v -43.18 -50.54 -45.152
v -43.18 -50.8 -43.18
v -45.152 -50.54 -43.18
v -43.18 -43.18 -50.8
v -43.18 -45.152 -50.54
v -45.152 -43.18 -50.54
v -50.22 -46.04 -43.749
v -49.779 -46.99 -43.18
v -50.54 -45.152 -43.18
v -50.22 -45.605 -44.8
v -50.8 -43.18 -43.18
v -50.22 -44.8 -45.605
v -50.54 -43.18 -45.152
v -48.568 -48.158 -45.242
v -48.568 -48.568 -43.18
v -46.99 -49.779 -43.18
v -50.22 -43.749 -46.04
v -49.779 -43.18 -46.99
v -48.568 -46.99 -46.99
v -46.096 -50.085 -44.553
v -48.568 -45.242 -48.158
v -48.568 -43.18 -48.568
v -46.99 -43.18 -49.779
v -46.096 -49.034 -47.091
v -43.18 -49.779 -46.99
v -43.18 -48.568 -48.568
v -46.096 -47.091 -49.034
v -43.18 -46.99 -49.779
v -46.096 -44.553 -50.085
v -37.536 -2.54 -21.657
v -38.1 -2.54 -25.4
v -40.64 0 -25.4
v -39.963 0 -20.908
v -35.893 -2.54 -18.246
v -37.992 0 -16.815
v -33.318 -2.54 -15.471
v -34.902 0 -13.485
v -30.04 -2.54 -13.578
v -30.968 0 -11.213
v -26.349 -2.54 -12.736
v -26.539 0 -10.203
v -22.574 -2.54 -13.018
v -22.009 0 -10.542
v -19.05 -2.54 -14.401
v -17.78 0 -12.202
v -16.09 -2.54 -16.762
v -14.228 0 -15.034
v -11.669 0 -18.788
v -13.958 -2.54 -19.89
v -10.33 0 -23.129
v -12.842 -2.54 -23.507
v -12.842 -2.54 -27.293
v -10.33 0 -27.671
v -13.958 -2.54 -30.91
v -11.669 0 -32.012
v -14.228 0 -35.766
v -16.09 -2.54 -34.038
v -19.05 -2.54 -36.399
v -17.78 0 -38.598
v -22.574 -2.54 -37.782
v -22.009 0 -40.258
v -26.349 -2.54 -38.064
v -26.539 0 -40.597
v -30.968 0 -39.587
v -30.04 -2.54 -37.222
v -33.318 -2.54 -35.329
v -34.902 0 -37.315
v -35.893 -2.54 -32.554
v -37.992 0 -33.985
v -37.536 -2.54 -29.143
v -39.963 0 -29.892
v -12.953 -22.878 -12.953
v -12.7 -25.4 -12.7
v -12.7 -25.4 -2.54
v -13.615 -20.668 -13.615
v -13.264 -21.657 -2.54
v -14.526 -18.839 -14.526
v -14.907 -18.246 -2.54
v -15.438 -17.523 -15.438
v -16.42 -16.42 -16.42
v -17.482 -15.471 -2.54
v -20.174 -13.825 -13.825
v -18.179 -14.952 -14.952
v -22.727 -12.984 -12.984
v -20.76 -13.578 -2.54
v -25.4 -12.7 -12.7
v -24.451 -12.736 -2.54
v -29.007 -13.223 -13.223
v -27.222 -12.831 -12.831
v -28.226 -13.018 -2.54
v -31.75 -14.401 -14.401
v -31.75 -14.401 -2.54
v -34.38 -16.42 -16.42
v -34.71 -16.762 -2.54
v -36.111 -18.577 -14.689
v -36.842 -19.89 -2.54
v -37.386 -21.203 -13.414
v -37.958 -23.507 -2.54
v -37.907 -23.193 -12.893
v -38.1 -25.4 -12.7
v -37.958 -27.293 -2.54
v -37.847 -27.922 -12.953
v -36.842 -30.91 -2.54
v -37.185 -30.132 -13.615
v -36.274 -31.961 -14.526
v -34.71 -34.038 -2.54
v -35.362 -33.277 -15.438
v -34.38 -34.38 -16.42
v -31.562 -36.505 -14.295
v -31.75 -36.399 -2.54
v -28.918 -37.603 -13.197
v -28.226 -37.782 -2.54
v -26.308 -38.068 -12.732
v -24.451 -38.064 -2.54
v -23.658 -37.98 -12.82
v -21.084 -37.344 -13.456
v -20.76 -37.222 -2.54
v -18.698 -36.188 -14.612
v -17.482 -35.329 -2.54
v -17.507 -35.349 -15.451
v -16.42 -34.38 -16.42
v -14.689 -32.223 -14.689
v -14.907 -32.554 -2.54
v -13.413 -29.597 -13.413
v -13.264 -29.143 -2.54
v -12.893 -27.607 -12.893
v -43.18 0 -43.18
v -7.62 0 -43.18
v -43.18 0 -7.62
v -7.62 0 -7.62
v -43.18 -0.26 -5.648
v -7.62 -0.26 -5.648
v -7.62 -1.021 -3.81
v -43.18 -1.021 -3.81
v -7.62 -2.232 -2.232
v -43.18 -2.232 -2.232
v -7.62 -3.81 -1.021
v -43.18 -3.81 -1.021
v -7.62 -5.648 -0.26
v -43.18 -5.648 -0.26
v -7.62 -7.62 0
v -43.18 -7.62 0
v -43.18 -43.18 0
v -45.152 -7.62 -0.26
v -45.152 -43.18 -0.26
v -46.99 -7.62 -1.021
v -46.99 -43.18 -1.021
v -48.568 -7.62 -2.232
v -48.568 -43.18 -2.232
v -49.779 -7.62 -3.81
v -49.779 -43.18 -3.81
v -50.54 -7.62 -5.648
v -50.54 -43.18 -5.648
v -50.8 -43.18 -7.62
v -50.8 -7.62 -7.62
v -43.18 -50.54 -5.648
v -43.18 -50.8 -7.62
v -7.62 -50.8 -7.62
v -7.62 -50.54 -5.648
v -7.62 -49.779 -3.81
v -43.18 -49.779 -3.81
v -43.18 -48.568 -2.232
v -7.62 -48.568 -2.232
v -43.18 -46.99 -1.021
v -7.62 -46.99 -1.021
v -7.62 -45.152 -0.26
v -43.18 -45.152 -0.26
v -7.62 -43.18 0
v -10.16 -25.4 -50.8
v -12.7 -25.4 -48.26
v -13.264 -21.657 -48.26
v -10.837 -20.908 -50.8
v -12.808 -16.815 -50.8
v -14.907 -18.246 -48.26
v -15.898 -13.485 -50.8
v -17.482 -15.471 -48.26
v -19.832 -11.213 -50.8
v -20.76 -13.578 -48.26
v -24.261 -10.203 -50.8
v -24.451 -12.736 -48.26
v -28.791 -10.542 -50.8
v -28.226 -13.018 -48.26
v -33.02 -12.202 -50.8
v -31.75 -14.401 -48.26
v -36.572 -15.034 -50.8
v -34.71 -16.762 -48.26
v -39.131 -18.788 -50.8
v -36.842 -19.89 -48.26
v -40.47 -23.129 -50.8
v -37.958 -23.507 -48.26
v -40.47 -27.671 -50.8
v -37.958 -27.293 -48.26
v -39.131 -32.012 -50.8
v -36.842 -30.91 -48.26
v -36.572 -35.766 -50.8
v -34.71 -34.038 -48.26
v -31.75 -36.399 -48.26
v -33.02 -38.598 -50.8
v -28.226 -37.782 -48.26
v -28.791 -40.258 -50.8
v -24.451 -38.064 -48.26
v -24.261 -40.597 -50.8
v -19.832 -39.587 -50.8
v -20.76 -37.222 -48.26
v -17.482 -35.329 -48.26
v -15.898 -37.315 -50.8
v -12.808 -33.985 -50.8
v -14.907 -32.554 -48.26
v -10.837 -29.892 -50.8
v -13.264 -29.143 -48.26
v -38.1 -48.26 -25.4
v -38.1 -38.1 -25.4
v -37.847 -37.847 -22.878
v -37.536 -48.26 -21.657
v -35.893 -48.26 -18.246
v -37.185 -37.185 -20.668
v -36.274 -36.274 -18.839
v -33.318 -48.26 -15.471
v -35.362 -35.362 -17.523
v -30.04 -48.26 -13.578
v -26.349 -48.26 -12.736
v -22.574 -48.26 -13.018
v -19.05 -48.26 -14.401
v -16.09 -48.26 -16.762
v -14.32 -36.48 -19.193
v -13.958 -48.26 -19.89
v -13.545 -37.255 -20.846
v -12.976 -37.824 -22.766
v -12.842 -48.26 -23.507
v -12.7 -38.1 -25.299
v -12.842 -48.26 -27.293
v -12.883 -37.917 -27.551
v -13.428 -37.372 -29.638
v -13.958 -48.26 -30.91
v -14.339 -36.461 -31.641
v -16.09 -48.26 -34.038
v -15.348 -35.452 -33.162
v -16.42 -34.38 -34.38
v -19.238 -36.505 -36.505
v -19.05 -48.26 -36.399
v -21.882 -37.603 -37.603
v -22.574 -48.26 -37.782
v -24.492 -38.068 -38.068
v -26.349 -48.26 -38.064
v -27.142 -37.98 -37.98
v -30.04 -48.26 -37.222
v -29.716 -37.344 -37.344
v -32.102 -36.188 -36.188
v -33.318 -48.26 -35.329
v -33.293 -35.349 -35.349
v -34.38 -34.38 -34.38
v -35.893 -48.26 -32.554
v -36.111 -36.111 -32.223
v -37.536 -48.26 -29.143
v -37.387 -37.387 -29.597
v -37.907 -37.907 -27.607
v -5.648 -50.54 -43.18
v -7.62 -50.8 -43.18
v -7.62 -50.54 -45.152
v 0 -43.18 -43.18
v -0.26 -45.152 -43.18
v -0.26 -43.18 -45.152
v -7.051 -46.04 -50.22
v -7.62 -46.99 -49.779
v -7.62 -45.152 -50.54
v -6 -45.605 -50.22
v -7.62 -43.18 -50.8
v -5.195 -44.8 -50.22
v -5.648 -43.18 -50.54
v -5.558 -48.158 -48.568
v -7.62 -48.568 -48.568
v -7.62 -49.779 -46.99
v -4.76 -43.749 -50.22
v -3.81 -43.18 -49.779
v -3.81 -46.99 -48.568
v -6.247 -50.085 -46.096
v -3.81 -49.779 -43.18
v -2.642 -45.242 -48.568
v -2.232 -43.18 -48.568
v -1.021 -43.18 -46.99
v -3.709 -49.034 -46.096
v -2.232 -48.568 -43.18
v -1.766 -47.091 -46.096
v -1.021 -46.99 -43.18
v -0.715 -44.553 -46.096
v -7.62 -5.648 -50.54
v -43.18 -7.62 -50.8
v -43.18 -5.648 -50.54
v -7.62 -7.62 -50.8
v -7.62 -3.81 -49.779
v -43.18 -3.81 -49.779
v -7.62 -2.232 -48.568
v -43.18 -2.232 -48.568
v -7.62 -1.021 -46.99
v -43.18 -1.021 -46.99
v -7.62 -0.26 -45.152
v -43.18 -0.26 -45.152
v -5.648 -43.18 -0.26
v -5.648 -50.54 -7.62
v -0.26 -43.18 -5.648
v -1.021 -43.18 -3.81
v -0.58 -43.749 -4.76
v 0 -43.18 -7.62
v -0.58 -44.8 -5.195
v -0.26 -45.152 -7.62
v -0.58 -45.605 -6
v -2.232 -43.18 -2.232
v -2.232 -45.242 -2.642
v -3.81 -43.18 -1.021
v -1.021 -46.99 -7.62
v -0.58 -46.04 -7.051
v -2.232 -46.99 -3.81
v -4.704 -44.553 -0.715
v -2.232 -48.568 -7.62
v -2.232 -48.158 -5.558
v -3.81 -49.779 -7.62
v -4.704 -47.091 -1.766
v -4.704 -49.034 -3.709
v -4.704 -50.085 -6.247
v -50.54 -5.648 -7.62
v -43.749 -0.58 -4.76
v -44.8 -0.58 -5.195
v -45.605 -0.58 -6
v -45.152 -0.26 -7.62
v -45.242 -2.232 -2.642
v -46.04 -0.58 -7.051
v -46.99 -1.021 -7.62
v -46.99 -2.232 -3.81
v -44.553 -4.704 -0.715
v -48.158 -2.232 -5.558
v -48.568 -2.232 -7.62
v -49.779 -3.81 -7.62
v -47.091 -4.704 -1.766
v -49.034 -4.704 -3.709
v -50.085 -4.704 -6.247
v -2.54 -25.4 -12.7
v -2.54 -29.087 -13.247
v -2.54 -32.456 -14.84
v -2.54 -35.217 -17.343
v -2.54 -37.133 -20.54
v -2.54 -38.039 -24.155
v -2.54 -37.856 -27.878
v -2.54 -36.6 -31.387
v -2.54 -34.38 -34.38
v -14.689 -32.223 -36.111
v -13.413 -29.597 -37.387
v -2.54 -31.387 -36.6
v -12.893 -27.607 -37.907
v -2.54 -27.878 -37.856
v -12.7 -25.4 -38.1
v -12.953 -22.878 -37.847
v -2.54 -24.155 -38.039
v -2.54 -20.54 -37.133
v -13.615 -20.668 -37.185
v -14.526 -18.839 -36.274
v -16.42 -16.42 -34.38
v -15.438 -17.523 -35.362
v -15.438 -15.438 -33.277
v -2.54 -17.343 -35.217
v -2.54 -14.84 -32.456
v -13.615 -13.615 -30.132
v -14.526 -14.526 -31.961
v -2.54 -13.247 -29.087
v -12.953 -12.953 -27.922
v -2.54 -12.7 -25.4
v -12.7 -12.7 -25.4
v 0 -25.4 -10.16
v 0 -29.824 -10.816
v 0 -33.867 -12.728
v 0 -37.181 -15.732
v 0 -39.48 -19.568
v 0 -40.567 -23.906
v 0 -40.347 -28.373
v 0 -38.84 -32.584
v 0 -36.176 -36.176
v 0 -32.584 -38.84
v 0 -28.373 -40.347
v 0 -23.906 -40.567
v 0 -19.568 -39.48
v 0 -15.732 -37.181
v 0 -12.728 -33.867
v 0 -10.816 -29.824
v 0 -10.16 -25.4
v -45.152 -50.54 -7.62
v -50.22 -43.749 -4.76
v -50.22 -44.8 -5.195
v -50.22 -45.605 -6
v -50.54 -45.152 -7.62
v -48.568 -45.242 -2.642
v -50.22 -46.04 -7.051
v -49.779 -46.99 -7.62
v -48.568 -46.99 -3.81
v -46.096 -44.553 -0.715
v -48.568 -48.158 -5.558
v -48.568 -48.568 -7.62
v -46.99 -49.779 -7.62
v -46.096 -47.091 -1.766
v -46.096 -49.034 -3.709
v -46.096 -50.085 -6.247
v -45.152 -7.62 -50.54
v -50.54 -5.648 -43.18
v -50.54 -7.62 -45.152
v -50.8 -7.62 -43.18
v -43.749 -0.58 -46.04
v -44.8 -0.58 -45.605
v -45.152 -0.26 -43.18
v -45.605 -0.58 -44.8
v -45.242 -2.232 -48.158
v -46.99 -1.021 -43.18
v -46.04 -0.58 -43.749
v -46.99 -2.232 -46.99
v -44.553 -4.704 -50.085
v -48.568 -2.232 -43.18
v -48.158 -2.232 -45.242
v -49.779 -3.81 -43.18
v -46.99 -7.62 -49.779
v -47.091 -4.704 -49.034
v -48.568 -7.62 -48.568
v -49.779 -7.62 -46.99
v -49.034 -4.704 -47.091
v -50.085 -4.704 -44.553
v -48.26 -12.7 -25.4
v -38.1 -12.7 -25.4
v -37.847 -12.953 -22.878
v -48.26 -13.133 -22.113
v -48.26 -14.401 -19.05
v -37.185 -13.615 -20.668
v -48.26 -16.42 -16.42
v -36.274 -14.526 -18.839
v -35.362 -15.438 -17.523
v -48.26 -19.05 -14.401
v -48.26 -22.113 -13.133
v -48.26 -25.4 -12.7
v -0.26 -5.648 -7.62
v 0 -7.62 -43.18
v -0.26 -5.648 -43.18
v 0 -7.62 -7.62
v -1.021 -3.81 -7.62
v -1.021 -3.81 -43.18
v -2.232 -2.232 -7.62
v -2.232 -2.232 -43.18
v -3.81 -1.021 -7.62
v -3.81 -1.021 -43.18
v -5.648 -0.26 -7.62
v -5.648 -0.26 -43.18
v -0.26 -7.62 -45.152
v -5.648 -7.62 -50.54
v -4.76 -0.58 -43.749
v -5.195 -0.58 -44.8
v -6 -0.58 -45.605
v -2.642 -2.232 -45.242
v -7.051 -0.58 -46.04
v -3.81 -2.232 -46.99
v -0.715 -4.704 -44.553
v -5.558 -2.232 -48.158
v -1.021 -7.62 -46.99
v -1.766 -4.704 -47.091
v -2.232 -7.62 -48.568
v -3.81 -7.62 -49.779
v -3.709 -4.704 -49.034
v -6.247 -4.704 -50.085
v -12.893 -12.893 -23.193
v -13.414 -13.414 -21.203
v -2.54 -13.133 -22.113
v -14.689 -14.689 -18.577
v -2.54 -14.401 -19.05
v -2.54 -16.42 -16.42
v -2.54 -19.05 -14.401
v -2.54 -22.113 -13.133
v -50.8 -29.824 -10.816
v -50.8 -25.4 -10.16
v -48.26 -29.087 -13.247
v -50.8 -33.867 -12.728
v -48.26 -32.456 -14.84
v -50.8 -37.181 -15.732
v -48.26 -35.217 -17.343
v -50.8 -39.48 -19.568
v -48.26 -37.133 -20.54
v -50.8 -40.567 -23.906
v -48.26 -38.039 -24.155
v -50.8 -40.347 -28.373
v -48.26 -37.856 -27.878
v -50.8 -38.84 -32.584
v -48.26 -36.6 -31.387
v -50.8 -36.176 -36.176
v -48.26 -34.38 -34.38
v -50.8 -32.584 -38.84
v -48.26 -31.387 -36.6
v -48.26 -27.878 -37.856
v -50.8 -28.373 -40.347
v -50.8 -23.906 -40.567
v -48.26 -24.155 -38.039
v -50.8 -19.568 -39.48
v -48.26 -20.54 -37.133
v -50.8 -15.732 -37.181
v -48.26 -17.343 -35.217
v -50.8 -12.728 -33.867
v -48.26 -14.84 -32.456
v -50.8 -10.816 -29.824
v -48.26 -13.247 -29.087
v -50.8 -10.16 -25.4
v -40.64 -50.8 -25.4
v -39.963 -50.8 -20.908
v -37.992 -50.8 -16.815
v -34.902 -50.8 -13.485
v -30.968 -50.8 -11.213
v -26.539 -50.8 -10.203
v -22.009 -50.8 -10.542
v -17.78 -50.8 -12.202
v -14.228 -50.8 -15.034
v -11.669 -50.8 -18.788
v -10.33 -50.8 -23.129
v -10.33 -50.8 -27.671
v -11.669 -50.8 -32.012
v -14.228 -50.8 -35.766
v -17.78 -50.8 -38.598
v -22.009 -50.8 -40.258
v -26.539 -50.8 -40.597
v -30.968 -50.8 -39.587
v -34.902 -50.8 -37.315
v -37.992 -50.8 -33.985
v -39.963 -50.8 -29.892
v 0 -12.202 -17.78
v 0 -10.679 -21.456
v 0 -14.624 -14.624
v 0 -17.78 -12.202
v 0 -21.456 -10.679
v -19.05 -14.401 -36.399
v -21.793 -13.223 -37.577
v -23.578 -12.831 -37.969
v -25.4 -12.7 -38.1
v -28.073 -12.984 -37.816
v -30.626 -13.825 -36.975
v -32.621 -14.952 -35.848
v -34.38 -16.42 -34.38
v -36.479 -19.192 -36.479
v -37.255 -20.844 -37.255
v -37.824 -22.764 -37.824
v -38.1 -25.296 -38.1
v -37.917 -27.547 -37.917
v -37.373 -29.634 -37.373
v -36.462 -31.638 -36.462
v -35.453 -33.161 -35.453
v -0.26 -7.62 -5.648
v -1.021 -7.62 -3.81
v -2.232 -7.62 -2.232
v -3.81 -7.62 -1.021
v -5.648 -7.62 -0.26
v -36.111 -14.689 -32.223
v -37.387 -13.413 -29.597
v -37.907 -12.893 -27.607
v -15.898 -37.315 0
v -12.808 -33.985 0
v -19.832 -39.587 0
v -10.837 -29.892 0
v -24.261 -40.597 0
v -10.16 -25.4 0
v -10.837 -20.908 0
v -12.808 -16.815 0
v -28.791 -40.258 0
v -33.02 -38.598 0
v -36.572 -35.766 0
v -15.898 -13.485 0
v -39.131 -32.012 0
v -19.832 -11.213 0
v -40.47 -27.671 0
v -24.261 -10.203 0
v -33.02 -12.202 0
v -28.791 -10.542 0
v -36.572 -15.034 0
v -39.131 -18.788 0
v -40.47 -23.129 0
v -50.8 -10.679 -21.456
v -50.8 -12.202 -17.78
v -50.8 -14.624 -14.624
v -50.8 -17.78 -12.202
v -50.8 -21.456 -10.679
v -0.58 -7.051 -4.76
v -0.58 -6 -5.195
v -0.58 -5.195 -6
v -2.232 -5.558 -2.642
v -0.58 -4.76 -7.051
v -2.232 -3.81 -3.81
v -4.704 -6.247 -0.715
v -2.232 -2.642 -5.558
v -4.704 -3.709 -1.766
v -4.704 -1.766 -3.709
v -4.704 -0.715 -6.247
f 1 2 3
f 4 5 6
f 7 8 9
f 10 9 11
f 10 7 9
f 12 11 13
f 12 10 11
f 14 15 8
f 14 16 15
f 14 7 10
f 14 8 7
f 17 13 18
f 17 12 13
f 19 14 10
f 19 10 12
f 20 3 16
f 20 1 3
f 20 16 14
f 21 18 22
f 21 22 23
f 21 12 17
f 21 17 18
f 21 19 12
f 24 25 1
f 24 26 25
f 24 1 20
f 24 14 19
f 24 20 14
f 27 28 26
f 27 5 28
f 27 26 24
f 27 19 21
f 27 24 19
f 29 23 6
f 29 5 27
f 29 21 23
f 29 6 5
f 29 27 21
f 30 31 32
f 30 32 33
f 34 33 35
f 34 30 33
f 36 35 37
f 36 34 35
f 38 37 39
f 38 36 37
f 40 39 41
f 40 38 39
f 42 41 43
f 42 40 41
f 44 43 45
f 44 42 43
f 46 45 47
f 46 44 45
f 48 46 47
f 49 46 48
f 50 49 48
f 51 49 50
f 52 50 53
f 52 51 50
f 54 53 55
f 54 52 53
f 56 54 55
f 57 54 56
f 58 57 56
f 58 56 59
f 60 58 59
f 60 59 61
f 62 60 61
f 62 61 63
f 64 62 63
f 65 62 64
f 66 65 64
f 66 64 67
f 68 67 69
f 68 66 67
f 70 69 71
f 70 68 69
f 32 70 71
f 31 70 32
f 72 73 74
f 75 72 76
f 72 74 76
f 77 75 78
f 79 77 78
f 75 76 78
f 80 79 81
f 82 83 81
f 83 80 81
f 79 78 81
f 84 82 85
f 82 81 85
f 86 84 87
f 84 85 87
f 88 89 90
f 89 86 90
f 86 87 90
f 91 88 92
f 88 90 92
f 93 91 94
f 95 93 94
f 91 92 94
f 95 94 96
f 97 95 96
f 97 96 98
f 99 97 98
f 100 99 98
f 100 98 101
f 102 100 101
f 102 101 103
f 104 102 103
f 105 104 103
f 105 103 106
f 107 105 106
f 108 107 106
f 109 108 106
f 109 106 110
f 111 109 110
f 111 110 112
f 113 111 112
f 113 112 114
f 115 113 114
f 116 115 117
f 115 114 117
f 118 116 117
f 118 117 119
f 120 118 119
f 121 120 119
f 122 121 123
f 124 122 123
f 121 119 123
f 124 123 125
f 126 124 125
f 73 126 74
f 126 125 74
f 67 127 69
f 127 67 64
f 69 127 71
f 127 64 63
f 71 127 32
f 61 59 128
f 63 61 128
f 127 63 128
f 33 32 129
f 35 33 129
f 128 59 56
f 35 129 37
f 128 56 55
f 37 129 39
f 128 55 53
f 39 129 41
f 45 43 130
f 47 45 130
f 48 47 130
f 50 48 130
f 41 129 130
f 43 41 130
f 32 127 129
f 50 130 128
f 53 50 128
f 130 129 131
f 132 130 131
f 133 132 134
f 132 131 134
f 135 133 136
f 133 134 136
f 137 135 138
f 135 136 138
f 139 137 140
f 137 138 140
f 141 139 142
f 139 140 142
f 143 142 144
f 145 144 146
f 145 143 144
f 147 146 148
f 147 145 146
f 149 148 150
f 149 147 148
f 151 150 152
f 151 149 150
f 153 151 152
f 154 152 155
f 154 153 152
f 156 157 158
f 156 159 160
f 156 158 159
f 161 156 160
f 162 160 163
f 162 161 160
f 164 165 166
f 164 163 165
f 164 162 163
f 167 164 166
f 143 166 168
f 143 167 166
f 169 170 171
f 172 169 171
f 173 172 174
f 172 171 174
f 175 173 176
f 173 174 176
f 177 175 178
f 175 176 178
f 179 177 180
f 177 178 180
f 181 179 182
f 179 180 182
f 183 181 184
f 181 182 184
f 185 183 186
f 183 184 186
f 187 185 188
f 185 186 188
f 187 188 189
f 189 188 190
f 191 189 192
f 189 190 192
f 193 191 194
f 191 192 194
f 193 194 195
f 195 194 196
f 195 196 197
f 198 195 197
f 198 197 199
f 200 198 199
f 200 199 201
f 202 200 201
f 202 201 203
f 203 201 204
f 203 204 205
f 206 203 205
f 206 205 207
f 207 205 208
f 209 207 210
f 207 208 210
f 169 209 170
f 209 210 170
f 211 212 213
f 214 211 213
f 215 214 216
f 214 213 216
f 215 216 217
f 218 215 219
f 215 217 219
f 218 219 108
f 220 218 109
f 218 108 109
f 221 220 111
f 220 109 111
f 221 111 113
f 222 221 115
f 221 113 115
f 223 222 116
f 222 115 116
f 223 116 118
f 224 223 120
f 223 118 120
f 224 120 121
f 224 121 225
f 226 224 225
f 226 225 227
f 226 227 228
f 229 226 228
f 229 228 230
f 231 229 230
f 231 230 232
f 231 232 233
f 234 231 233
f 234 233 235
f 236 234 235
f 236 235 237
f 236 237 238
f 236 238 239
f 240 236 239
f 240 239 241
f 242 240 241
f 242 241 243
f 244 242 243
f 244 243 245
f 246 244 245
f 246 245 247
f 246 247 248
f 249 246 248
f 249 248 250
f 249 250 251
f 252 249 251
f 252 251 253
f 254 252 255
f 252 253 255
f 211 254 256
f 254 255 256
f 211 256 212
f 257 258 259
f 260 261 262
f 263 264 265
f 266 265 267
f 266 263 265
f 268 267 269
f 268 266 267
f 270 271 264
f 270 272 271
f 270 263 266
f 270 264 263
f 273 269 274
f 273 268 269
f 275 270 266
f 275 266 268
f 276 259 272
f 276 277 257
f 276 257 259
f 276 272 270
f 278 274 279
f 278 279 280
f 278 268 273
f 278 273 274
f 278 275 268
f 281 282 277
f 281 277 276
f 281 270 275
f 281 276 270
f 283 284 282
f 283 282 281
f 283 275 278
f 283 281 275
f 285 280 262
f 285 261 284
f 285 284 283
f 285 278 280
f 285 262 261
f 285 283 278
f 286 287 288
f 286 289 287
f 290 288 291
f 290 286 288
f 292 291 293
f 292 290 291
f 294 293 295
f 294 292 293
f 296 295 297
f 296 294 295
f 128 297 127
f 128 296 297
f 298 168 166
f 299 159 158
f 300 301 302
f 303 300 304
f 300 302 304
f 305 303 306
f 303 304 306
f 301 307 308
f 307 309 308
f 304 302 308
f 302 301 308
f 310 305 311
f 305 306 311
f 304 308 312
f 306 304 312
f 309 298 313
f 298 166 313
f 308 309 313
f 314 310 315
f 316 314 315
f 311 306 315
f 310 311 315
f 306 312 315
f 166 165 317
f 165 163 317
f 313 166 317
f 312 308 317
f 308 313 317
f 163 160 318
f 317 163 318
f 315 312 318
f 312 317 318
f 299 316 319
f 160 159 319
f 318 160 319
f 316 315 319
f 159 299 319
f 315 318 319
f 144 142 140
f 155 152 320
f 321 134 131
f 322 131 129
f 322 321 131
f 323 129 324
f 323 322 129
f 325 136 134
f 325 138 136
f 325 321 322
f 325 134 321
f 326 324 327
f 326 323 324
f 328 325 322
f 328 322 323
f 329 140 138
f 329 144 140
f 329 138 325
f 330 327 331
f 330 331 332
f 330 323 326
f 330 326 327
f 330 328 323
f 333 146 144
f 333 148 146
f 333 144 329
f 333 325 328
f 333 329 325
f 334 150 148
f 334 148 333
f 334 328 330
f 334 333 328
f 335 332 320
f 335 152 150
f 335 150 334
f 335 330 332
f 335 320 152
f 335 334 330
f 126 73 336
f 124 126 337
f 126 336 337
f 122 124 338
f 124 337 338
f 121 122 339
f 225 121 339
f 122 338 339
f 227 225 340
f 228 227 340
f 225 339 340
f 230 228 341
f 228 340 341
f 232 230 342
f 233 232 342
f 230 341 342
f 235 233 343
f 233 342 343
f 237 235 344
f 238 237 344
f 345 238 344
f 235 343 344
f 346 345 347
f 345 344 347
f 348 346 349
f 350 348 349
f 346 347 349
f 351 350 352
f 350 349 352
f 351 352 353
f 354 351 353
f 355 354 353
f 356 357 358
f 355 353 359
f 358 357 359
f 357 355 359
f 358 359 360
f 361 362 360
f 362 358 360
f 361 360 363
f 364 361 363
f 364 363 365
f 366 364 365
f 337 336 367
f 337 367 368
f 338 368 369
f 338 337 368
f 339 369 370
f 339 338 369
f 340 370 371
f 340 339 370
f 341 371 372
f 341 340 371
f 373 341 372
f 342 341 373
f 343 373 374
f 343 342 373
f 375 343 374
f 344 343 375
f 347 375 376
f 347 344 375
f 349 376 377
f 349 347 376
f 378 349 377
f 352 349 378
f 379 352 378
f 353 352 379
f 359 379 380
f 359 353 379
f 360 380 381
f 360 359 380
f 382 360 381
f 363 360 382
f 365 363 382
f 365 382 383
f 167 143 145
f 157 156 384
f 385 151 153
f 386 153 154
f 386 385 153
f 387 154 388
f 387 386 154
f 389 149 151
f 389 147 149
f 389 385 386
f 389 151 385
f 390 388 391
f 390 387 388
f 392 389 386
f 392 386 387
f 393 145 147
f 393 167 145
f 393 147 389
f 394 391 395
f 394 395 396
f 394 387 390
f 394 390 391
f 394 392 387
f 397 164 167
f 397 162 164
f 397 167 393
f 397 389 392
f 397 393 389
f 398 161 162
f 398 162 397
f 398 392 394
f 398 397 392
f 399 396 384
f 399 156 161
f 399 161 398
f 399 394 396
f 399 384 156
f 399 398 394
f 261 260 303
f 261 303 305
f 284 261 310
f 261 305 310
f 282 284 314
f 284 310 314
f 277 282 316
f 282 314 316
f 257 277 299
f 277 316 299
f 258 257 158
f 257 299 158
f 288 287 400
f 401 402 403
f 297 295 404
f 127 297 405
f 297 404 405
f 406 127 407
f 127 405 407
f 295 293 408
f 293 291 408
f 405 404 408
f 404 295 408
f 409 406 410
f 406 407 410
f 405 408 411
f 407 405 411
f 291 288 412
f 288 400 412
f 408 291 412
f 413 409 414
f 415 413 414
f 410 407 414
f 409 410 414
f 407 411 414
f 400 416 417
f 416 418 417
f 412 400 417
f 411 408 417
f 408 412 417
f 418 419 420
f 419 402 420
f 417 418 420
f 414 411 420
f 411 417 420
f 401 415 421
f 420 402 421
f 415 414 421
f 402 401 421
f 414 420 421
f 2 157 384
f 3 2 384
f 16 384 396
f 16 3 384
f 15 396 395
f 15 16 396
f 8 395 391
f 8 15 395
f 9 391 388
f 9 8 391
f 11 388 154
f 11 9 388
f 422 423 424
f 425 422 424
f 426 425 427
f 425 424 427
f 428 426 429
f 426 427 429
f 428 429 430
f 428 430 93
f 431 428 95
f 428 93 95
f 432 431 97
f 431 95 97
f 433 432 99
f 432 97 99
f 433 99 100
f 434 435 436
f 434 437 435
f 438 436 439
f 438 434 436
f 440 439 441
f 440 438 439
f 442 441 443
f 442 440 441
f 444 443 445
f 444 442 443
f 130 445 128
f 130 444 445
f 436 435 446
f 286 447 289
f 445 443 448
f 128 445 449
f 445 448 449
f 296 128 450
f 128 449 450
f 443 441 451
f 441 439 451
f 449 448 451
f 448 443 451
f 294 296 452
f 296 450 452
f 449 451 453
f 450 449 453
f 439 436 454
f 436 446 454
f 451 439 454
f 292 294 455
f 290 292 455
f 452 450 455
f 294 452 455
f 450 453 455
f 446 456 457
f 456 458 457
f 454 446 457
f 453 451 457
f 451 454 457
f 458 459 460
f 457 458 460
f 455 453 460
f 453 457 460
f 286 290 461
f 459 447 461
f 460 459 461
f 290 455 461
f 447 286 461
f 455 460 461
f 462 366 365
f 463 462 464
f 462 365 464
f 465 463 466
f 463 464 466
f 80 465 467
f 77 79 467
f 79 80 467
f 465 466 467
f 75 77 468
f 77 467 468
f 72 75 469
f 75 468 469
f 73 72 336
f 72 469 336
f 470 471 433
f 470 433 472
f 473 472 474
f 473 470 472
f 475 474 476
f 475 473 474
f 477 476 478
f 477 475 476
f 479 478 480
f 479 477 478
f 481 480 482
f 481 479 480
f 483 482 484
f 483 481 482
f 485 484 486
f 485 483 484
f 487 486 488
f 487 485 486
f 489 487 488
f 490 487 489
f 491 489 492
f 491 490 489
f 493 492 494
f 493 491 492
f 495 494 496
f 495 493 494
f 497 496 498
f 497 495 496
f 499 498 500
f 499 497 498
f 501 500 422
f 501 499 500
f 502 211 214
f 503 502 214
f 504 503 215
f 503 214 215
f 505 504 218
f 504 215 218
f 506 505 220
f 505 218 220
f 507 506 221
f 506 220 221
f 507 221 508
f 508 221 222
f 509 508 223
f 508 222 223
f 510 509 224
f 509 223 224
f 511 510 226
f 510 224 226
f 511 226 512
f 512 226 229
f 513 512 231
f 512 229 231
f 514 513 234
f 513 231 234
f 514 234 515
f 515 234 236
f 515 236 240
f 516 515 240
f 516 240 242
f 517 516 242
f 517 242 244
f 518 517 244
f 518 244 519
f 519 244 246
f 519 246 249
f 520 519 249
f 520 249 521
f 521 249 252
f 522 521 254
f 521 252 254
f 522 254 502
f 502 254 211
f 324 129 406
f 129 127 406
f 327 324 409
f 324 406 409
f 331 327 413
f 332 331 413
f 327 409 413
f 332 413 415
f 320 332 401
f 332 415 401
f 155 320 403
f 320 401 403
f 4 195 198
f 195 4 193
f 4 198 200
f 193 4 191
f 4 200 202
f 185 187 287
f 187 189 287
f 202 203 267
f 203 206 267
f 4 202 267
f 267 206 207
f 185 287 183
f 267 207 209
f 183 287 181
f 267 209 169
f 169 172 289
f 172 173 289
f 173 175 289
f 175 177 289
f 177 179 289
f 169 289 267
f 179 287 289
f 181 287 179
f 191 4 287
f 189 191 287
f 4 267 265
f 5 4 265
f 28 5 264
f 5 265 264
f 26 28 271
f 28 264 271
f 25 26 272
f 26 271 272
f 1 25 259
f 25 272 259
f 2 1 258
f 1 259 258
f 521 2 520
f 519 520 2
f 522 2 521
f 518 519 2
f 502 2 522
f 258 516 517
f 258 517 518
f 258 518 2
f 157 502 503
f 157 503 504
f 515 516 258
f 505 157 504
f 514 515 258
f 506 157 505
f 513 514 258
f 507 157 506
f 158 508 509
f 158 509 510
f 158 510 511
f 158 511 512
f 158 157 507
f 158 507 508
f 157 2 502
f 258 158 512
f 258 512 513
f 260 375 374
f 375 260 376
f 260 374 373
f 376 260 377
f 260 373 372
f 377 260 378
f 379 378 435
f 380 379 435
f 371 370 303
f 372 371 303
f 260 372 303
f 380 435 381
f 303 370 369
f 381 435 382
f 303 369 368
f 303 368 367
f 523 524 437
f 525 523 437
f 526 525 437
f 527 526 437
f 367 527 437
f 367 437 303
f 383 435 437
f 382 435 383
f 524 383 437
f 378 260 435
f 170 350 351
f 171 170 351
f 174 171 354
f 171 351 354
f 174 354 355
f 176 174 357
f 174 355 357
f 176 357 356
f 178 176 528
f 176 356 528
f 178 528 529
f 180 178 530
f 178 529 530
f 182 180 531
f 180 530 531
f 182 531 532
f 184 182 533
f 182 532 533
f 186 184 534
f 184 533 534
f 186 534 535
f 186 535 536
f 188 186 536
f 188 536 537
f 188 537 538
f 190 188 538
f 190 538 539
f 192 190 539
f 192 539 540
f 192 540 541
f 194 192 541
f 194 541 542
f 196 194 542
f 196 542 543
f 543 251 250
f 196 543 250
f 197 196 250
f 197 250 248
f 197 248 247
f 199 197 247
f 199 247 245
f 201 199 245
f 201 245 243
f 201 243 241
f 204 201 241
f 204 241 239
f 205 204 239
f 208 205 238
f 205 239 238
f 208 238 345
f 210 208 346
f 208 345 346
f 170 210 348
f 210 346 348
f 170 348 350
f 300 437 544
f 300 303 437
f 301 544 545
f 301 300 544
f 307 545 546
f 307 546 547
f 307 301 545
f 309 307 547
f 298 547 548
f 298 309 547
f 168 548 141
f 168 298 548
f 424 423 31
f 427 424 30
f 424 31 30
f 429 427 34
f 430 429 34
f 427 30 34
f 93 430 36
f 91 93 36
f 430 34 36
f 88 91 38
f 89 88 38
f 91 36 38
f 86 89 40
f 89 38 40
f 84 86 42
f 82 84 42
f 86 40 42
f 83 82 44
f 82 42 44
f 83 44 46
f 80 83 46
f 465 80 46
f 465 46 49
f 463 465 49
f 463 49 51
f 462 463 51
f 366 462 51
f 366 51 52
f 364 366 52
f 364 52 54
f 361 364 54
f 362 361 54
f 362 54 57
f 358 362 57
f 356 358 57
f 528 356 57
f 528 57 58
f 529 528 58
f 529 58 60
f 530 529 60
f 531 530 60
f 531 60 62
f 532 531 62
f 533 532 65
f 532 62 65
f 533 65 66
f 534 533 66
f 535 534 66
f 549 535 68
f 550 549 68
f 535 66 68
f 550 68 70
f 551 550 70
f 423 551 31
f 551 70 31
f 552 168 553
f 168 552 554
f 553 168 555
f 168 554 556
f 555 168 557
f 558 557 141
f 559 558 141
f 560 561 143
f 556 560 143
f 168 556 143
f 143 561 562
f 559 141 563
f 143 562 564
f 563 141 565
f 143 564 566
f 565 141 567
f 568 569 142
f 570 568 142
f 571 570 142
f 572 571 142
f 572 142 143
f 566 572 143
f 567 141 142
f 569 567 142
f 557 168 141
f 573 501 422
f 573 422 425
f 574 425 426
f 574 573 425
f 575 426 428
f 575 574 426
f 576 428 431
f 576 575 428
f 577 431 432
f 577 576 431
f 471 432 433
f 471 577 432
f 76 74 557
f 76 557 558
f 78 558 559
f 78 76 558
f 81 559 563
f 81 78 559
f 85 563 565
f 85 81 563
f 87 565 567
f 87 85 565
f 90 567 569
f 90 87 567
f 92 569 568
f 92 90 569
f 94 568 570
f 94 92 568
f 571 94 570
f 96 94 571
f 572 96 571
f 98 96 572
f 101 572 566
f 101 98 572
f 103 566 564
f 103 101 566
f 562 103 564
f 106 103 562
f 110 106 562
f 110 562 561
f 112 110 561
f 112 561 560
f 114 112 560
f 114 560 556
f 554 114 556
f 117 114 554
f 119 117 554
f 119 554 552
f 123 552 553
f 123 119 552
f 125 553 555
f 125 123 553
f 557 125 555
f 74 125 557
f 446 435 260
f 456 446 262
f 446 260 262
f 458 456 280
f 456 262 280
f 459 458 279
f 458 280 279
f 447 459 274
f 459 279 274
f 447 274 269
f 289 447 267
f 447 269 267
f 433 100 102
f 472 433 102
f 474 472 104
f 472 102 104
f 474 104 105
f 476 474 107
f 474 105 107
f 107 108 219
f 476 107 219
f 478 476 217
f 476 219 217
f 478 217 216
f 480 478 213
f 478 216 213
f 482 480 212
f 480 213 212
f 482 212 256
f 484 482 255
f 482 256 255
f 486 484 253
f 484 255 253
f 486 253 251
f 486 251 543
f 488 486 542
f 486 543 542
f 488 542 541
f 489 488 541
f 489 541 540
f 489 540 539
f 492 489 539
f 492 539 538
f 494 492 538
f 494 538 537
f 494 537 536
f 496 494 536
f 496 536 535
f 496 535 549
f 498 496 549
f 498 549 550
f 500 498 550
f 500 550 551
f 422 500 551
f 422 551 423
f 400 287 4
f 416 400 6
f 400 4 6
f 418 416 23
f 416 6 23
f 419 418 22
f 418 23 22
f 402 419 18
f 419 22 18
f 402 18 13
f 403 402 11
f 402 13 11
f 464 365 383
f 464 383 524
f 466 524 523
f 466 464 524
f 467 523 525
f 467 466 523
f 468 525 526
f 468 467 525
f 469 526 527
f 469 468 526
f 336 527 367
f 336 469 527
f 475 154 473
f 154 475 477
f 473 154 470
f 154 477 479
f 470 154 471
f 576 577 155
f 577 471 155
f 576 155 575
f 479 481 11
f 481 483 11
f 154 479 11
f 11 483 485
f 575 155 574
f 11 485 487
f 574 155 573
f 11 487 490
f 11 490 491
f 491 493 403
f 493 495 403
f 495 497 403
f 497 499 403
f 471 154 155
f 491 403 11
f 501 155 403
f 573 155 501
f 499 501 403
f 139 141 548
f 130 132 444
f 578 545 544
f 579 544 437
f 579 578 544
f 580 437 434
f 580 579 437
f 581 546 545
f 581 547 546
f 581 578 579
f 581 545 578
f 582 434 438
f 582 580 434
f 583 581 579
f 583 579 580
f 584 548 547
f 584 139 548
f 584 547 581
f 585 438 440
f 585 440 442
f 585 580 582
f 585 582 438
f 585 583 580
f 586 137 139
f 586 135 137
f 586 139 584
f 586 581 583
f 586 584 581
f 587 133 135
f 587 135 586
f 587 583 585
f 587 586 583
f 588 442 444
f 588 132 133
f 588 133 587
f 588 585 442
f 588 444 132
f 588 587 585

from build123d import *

# Parameters (mm, degrees)
F1_DEPTH = 50.8
F2_DEPTH = 50.8
F4_DEPTH = 80.772
F6_DEPTH = 101.346
F7_R     = 7.62
F8_SIZE  = 2.54


with BuildPart() as f1:
    # F0 (on Front) → F1 (new body)
    with BuildSketch(Plane.XZ):
        Polygon((0, -50.8), (0, 0), (-50.8, 0), (-50.8, -25.4), (-50.8, -50.8), align=None)
        with BuildLine():
            ThreePointArc((-12.7, -25.4), (-25.4, -38.1), (-38.1, -25.4))
            ThreePointArc((-38.1, -25.4), (-25.4, -12.7), (-12.7, -25.4))
        make_face(mode=Mode.SUBTRACT)
    extrude(amount=F1_DEPTH)

    # F0 (on Front) → F2 (join)
    with BuildSketch(Plane.XZ):
        Polygon((0, -50.8), (0, 0), (-50.8, 0), (-50.8, -25.4), (-50.8, -50.8), align=None)
        with BuildLine():
            ThreePointArc((-12.7, -25.4), (-25.4, -38.1), (-38.1, -25.4))
            ThreePointArc((-38.1, -25.4), (-25.4, -12.7), (-12.7, -25.4))
        make_face(mode=Mode.SUBTRACT)
    extrude(amount=F2_DEPTH)

    # F3 (on face) → F4 (cut)
    with BuildSketch(Plane.XY):
        with BuildLine():
            ThreePointArc((-38.1, -25.4), (-25.4, -38.1), (-12.7, -25.4))
            ThreePointArc((-12.7, -25.4), (-25.4, -12.7), (-38.1, -25.4))
        make_face()
    extrude(amount=-F4_DEPTH, mode=Mode.SUBTRACT)

    # F5 (on face) → F6 (cut)
    with BuildSketch(Plane.YZ):
        with BuildLine():
            ThreePointArc((-25.4, -12.7), (-34.3802561211, -34.3802561211), (-12.7, -25.4))
            ThreePointArc((-12.7, -25.4), (-16.4197438789, -16.4197438789), (-25.4, -12.7))
        make_face()
    extrude(amount=-F6_DEPTH, mode=Mode.SUBTRACT)

    # F7
    f7_edges = [f1.edges().sort_by_distance(p)[0] for p in [
        (-25.4, -50.8, 0),
        (-50.8, -25.4, 0),
        (-25.4, 0, 0),
        (0, -25.4, 0),
        (0, -50.8, -25.4),
        (-25.4, -50.8, -50.8),
        (0, -25.4, -50.8),
        (0, 0, -25.4),
        (-50.8, -50.8, -25.4),
        (-50.8, -25.4, -50.8),
        (-25.4, 0, -50.8),
        (-50.8, 0, -25.4),
    ]]
    fillet(f7_edges, radius=F7_R)

    # F8
    f8_edges = [f1.edges().sort_by_distance(p)[0] for p in [
        (-38.1, -25.4, 0),
        (-38.1, -50.8, -25.4),
        (0, -38.1, -25.4),
        (-38.1, 0, -25.4),
        (-50.8, -38.1, -25.4),
        (-38.1, -25.4, -50.8),
    ]]
    chamfer(f8_edges, length=F8_SIZE)


solid = f1.part
